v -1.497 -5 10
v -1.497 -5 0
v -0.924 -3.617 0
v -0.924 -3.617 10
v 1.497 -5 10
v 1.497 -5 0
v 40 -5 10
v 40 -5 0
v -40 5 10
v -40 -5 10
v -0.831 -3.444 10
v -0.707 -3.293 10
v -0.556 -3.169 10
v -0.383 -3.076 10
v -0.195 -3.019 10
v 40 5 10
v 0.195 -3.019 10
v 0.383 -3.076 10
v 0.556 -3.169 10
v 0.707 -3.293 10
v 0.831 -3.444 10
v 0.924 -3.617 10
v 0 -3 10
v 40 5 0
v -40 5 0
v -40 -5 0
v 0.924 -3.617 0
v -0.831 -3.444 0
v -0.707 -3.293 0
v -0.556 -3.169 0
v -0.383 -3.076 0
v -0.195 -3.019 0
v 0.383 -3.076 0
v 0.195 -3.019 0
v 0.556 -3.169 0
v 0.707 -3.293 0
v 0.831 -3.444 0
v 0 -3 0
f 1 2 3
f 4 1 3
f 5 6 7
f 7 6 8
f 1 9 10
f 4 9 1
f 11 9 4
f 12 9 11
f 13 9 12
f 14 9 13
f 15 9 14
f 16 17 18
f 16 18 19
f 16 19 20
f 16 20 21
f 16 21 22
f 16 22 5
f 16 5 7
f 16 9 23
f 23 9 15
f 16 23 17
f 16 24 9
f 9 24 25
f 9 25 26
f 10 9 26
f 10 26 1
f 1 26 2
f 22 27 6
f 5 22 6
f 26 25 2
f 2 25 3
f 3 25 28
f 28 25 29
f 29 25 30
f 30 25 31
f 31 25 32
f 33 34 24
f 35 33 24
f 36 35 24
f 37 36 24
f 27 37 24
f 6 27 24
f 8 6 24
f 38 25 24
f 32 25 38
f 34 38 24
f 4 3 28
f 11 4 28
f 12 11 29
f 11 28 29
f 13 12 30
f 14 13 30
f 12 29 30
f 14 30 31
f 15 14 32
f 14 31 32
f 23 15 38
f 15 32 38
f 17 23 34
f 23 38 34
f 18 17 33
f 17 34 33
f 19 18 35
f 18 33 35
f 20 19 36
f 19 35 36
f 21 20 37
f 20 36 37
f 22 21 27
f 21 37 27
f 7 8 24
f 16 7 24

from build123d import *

# Parameters (mm, degrees)
F1_DEPTH = 10


with BuildPart() as f1:
    # F0 (on Top) → F1 (new body)
    with BuildSketch(Plane.XY):
        with BuildLine():
            Line((40, 5), (-40, 5))
            Line((-40, 5), (-40, -5))
            Line((-40, -5), (-1.496606, -5))
            Line((-1.496606, -5), (-0.92388, -3.617317))
            ThreePointArc((-0.92388, -3.617317), (0, -3), (0.92388, -3.617317))
            Line((0.92388, -3.617317), (1.496606, -5))
            Line((1.496606, -5), (40, -5))
            Line((40, -5), (40, 5))
        make_face()
    extrude(amount=F1_DEPTH)


solid = f1.part
